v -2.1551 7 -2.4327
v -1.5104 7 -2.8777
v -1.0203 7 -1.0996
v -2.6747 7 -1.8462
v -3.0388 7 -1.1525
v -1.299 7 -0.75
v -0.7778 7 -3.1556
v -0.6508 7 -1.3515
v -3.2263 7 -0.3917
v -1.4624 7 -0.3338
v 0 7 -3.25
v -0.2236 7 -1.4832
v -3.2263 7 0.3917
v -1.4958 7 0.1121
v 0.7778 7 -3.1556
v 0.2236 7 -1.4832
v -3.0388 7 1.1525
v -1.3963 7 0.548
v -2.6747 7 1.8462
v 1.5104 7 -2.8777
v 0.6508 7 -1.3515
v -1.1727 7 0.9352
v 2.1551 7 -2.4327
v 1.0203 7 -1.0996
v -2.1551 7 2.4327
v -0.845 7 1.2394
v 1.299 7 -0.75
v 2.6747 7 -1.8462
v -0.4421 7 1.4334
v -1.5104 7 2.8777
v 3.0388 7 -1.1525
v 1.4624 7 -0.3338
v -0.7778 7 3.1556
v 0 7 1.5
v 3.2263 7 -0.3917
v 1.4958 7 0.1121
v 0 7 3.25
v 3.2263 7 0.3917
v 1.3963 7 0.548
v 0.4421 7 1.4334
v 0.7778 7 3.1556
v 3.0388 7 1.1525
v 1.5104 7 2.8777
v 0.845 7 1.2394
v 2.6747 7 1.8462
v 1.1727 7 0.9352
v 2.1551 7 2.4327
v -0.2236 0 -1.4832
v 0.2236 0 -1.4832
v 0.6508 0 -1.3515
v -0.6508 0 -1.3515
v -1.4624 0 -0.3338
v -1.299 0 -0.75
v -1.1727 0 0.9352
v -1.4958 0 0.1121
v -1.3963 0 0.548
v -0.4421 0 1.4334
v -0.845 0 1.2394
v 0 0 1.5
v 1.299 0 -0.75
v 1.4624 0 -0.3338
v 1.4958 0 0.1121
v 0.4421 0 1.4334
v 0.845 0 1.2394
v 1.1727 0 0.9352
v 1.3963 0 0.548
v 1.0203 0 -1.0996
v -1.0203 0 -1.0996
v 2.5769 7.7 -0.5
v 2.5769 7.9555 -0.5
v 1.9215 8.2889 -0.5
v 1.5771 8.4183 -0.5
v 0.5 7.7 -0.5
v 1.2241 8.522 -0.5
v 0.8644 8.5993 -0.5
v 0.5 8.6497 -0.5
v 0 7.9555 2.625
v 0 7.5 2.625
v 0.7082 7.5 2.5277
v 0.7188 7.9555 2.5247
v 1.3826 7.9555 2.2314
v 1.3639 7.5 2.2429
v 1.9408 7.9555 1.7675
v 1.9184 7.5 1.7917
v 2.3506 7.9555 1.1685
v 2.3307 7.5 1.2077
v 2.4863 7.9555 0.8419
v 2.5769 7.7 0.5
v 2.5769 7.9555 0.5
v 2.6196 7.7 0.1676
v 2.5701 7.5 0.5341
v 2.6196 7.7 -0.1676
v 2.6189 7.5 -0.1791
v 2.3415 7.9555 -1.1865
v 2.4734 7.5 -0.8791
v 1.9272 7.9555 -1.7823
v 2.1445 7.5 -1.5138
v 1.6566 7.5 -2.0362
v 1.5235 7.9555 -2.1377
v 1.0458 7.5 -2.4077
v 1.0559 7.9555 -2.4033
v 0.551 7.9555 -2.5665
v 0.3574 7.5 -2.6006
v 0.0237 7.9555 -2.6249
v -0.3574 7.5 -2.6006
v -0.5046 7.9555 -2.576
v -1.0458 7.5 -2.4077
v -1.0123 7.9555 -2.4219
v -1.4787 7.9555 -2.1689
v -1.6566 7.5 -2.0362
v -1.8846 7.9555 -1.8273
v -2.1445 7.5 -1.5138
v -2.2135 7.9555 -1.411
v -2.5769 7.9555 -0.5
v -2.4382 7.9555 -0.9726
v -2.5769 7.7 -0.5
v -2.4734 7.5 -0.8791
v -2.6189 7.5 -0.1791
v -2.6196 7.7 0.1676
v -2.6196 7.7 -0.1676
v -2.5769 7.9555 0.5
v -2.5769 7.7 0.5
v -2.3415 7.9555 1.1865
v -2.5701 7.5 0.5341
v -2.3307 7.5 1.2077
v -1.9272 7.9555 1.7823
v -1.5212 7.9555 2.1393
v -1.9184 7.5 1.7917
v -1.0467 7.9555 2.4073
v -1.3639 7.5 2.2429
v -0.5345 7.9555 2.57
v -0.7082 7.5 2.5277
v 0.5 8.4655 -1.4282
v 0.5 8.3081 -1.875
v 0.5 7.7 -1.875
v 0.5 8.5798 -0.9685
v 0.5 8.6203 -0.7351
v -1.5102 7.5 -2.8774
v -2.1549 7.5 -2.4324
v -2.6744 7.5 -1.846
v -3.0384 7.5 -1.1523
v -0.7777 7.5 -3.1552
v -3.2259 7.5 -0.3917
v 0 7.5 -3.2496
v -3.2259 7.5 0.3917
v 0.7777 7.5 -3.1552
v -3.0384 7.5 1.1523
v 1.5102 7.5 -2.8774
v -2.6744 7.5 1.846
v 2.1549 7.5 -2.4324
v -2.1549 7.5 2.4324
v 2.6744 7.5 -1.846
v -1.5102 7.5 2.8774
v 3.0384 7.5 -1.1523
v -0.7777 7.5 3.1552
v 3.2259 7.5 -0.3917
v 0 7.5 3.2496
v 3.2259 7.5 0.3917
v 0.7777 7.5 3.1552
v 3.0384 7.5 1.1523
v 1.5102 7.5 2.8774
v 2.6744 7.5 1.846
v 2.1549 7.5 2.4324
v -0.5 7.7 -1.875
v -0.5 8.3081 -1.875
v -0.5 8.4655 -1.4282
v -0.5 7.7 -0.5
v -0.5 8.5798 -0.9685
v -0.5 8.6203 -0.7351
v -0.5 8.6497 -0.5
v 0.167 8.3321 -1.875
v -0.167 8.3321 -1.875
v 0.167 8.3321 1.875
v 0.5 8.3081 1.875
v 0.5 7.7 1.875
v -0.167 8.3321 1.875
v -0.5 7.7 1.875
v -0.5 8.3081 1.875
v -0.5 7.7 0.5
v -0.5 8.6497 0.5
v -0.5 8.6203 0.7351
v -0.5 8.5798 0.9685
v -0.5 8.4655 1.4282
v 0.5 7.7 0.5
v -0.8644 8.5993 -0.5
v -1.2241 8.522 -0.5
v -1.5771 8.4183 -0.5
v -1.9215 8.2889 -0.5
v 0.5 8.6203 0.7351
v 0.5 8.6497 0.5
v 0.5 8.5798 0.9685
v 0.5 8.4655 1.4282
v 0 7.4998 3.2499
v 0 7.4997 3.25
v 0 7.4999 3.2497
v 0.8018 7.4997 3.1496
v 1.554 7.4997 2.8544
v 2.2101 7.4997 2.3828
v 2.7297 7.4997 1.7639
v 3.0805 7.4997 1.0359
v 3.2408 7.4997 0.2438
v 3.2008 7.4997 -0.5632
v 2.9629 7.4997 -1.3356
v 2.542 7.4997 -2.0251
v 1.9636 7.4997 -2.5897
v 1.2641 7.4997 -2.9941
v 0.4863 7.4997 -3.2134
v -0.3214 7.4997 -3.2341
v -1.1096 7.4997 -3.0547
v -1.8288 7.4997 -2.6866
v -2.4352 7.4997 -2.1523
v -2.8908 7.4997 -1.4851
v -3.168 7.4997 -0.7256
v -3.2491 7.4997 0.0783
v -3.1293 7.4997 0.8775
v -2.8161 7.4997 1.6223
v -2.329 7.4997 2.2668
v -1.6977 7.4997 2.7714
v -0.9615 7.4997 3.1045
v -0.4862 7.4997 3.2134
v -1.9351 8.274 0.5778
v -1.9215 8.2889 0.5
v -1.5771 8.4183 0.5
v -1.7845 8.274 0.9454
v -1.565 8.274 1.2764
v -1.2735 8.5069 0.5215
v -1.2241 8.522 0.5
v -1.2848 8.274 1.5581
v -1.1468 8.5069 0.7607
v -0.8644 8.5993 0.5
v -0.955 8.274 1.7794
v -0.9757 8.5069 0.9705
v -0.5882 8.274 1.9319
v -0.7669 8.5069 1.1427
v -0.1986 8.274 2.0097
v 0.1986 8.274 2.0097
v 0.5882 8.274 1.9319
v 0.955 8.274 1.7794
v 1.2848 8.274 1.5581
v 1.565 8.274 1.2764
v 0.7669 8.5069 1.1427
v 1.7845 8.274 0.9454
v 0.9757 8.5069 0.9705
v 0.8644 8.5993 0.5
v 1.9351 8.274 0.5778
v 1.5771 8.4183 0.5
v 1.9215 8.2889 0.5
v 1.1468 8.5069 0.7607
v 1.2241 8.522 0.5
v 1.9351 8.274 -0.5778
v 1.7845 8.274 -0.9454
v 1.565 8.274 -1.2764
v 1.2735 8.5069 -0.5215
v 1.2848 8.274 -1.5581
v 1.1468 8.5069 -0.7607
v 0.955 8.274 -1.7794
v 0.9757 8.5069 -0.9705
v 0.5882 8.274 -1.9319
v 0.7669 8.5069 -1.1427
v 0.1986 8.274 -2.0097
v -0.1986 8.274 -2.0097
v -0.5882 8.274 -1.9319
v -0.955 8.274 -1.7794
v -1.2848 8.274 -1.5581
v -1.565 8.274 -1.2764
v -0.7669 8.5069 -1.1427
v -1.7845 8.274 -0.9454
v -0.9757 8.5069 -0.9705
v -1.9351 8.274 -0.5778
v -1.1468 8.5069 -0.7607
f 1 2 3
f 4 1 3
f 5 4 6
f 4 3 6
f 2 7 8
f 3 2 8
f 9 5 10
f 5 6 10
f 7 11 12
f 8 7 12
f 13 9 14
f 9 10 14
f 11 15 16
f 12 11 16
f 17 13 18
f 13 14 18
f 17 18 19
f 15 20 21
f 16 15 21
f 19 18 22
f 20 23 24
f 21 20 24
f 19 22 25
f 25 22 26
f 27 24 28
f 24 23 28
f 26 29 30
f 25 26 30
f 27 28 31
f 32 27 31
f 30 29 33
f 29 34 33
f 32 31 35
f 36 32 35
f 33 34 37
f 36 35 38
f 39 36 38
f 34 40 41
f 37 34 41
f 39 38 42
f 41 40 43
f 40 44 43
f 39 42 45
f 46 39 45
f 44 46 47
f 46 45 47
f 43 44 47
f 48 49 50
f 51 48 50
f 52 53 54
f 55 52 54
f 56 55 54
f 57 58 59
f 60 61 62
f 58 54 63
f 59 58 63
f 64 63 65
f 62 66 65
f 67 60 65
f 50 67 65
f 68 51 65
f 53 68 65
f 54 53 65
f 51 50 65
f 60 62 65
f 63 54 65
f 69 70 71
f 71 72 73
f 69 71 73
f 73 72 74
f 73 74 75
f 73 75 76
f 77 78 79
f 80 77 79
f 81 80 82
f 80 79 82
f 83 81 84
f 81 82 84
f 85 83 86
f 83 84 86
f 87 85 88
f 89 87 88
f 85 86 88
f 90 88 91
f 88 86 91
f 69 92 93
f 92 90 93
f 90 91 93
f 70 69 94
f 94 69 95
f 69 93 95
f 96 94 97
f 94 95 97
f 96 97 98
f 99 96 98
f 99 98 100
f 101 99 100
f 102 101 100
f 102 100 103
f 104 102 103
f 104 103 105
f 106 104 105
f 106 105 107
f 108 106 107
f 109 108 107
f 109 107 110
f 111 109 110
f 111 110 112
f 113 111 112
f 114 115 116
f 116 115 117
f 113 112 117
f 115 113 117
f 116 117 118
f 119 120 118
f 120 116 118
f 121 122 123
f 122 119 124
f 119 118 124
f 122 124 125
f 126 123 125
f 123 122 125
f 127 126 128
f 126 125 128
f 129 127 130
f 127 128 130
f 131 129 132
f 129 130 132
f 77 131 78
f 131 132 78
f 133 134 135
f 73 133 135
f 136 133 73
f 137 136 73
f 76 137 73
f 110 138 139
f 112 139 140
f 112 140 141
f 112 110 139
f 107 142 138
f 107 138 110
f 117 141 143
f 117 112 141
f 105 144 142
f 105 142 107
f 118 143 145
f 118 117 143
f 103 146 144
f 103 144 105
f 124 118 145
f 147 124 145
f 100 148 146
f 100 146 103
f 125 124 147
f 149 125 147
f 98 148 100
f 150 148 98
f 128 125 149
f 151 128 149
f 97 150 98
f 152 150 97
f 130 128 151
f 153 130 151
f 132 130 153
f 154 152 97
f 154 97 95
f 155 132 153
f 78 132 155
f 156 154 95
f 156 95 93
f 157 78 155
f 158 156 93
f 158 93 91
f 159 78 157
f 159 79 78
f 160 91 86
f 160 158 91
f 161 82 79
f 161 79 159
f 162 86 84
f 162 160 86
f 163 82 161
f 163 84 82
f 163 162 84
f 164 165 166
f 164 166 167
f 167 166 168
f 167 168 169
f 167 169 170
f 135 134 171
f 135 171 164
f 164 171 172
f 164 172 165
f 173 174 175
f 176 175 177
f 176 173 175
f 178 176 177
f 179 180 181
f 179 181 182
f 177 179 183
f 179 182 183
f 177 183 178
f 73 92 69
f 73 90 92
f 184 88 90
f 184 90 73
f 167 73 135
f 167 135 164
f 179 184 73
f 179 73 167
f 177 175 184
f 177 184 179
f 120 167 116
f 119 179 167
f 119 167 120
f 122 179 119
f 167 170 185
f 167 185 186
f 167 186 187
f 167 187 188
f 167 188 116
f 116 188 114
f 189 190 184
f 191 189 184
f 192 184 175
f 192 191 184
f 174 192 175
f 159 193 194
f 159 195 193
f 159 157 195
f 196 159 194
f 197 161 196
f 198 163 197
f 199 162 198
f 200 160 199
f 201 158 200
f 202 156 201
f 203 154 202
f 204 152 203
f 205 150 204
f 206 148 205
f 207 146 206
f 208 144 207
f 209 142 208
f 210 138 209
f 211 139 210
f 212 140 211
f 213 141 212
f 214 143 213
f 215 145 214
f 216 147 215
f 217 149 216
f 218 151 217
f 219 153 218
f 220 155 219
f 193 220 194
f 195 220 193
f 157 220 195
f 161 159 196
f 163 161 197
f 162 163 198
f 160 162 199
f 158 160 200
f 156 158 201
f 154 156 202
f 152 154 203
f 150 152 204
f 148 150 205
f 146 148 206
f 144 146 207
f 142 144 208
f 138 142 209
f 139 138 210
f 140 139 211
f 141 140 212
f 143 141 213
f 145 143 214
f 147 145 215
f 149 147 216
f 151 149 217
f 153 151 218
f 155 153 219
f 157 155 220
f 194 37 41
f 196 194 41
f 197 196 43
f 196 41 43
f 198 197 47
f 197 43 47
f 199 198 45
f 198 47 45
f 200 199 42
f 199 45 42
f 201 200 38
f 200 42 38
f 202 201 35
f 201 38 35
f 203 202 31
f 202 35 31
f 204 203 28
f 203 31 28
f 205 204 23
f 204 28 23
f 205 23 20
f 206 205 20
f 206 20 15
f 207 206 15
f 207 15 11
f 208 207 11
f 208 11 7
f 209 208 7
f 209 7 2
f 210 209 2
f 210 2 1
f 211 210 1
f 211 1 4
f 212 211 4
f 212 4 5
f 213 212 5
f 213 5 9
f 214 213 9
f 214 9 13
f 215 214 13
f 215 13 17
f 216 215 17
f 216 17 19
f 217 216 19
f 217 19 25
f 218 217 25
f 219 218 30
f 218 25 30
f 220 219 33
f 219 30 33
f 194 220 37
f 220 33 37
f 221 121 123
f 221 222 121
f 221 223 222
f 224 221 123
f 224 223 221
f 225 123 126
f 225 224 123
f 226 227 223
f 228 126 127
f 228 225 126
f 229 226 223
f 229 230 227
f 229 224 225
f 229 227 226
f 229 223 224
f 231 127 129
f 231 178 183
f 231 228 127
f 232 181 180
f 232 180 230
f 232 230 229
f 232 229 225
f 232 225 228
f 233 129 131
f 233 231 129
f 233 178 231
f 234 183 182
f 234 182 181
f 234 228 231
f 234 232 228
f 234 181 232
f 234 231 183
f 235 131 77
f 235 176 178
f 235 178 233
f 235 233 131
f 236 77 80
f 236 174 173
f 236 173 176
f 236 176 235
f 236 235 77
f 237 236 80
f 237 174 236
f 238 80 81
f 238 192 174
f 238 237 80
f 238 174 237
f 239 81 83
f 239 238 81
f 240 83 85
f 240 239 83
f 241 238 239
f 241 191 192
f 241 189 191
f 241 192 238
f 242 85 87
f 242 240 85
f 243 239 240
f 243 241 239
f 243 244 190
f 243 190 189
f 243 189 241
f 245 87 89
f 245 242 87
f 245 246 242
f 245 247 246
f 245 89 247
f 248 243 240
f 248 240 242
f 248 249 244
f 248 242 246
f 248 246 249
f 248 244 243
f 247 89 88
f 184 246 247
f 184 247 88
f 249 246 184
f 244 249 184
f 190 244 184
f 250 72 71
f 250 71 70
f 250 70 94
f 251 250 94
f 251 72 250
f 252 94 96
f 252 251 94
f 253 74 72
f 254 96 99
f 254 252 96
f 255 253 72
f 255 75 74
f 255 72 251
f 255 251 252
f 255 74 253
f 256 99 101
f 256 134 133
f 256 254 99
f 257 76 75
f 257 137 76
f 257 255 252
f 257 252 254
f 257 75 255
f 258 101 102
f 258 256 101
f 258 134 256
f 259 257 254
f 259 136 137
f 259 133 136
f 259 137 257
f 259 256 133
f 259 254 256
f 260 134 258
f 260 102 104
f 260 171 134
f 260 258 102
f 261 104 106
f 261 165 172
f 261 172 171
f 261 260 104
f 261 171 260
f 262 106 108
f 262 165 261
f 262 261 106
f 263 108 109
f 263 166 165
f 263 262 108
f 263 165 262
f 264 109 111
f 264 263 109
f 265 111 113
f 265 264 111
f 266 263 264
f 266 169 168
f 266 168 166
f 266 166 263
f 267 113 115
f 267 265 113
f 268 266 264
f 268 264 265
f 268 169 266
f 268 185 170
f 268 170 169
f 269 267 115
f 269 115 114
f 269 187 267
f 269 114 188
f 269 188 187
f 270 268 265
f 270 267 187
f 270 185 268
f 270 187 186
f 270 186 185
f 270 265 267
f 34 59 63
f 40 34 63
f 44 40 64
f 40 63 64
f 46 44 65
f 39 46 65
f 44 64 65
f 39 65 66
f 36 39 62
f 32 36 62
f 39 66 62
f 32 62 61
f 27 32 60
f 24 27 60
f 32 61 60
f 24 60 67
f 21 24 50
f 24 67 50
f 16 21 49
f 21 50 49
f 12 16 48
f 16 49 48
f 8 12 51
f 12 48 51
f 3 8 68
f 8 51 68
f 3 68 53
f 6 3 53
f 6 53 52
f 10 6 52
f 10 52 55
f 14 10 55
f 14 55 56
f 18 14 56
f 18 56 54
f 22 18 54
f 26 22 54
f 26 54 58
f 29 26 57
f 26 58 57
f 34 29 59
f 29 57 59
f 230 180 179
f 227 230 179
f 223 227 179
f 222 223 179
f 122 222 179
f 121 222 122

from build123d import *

# Parameters (mm, degrees)
SKETCH_1_R          = 1.5
EXTRUDE_1_DEPTH     = 7
SKETCH_6_R          = 3.25
EXTRUDE_1_2_DEPTH   = 0.5
SKETCH_2_R          = 2.625
EXTRUDE_2_DEPTH     = 1.2
SKETCH_3_W          = 7.004697232
SKETCH_3_H          = 1
CUT_EXTRUDE_1_DEPTH = 1
SKETCH_4_W          = 1
SKETCH_4_H          = 3.75
CUT_EXTRUDE_2_DEPTH = 1


with BuildPart() as part:
    # 草图1 → Extrude 1 (new body)
    with BuildSketch(Plane(origin=(0, 0, 0), x_dir=(1, 0, 0), z_dir=(0, 1, 0))):
        with Locations(Location((0, 0, 0), (0, 0, 270))):
            Circle(SKETCH_1_R)
    extrude(amount=EXTRUDE_1_DEPTH)

    # 草图6 → Extrude 1 2 (add)
    with BuildSketch(Plane(origin=(0, 7, 0), x_dir=(1, 0, 0), z_dir=(0, 1, 0))):
        with Locations(Location((0, 0, 0), (0, 0, 270))):
            Circle(SKETCH_6_R)
    extrude(amount=EXTRUDE_1_2_DEPTH)

    # 草图2 → 拉伸2 (add)
    with BuildSketch(Plane(origin=(0, 7.5, 0), x_dir=(-1, 0, 0), z_dir=(0, 1, 0))):
        with Locations(Location((0, 0, 0), (0, 0, 90))):
            Circle(SKETCH_2_R)
    extrude(amount=EXTRUDE_2_DEPTH)

    # 草图3 → 切除-拉伸1 (cut)
    with BuildSketch(Plane(origin=(0, 8.7, 0), x_dir=(-1, 0, 0), z_dir=(0, 1, 0))):
        Rectangle(SKETCH_3_W, SKETCH_3_H)
    extrude(amount=-CUT_EXTRUDE_1_DEPTH, mode=Mode.SUBTRACT)

    # 草图4 → 切除-拉伸2 (cut)
    with BuildSketch(Plane(origin=(0, 8.7, 0), x_dir=(-1, 0, 0), z_dir=(0, 1, 0))):
        Rectangle(SKETCH_4_W, SKETCH_4_H)
    extrude(amount=-CUT_EXTRUDE_2_DEPTH, mode=Mode.SUBTRACT)

    # 草图5 → 切除-旋转16 (revolve, cut)
    with BuildSketch(Plane(origin=(0, 0, 0), x_dir=(0, 0, -1), z_dir=(1, 0, 0))):
        with BuildLine():
            Line((0, 11.324107024), (-3.685811759, 11.324107024))
            Line((-3.685811759, 11.324107024), (-3.685811759, 7.078578352))
            ThreePointArc((-3.685811759, 7.078578352), (-2.013344014, 8.276728731), (0, 8.7))
            Line((0, 8.7), (0, 11.324107024))
        make_face()
    revolve(axis=Axis((0, -2.105917543, 0), (0, 1, 0)), mode=Mode.SUBTRACT)


solid = part.part
